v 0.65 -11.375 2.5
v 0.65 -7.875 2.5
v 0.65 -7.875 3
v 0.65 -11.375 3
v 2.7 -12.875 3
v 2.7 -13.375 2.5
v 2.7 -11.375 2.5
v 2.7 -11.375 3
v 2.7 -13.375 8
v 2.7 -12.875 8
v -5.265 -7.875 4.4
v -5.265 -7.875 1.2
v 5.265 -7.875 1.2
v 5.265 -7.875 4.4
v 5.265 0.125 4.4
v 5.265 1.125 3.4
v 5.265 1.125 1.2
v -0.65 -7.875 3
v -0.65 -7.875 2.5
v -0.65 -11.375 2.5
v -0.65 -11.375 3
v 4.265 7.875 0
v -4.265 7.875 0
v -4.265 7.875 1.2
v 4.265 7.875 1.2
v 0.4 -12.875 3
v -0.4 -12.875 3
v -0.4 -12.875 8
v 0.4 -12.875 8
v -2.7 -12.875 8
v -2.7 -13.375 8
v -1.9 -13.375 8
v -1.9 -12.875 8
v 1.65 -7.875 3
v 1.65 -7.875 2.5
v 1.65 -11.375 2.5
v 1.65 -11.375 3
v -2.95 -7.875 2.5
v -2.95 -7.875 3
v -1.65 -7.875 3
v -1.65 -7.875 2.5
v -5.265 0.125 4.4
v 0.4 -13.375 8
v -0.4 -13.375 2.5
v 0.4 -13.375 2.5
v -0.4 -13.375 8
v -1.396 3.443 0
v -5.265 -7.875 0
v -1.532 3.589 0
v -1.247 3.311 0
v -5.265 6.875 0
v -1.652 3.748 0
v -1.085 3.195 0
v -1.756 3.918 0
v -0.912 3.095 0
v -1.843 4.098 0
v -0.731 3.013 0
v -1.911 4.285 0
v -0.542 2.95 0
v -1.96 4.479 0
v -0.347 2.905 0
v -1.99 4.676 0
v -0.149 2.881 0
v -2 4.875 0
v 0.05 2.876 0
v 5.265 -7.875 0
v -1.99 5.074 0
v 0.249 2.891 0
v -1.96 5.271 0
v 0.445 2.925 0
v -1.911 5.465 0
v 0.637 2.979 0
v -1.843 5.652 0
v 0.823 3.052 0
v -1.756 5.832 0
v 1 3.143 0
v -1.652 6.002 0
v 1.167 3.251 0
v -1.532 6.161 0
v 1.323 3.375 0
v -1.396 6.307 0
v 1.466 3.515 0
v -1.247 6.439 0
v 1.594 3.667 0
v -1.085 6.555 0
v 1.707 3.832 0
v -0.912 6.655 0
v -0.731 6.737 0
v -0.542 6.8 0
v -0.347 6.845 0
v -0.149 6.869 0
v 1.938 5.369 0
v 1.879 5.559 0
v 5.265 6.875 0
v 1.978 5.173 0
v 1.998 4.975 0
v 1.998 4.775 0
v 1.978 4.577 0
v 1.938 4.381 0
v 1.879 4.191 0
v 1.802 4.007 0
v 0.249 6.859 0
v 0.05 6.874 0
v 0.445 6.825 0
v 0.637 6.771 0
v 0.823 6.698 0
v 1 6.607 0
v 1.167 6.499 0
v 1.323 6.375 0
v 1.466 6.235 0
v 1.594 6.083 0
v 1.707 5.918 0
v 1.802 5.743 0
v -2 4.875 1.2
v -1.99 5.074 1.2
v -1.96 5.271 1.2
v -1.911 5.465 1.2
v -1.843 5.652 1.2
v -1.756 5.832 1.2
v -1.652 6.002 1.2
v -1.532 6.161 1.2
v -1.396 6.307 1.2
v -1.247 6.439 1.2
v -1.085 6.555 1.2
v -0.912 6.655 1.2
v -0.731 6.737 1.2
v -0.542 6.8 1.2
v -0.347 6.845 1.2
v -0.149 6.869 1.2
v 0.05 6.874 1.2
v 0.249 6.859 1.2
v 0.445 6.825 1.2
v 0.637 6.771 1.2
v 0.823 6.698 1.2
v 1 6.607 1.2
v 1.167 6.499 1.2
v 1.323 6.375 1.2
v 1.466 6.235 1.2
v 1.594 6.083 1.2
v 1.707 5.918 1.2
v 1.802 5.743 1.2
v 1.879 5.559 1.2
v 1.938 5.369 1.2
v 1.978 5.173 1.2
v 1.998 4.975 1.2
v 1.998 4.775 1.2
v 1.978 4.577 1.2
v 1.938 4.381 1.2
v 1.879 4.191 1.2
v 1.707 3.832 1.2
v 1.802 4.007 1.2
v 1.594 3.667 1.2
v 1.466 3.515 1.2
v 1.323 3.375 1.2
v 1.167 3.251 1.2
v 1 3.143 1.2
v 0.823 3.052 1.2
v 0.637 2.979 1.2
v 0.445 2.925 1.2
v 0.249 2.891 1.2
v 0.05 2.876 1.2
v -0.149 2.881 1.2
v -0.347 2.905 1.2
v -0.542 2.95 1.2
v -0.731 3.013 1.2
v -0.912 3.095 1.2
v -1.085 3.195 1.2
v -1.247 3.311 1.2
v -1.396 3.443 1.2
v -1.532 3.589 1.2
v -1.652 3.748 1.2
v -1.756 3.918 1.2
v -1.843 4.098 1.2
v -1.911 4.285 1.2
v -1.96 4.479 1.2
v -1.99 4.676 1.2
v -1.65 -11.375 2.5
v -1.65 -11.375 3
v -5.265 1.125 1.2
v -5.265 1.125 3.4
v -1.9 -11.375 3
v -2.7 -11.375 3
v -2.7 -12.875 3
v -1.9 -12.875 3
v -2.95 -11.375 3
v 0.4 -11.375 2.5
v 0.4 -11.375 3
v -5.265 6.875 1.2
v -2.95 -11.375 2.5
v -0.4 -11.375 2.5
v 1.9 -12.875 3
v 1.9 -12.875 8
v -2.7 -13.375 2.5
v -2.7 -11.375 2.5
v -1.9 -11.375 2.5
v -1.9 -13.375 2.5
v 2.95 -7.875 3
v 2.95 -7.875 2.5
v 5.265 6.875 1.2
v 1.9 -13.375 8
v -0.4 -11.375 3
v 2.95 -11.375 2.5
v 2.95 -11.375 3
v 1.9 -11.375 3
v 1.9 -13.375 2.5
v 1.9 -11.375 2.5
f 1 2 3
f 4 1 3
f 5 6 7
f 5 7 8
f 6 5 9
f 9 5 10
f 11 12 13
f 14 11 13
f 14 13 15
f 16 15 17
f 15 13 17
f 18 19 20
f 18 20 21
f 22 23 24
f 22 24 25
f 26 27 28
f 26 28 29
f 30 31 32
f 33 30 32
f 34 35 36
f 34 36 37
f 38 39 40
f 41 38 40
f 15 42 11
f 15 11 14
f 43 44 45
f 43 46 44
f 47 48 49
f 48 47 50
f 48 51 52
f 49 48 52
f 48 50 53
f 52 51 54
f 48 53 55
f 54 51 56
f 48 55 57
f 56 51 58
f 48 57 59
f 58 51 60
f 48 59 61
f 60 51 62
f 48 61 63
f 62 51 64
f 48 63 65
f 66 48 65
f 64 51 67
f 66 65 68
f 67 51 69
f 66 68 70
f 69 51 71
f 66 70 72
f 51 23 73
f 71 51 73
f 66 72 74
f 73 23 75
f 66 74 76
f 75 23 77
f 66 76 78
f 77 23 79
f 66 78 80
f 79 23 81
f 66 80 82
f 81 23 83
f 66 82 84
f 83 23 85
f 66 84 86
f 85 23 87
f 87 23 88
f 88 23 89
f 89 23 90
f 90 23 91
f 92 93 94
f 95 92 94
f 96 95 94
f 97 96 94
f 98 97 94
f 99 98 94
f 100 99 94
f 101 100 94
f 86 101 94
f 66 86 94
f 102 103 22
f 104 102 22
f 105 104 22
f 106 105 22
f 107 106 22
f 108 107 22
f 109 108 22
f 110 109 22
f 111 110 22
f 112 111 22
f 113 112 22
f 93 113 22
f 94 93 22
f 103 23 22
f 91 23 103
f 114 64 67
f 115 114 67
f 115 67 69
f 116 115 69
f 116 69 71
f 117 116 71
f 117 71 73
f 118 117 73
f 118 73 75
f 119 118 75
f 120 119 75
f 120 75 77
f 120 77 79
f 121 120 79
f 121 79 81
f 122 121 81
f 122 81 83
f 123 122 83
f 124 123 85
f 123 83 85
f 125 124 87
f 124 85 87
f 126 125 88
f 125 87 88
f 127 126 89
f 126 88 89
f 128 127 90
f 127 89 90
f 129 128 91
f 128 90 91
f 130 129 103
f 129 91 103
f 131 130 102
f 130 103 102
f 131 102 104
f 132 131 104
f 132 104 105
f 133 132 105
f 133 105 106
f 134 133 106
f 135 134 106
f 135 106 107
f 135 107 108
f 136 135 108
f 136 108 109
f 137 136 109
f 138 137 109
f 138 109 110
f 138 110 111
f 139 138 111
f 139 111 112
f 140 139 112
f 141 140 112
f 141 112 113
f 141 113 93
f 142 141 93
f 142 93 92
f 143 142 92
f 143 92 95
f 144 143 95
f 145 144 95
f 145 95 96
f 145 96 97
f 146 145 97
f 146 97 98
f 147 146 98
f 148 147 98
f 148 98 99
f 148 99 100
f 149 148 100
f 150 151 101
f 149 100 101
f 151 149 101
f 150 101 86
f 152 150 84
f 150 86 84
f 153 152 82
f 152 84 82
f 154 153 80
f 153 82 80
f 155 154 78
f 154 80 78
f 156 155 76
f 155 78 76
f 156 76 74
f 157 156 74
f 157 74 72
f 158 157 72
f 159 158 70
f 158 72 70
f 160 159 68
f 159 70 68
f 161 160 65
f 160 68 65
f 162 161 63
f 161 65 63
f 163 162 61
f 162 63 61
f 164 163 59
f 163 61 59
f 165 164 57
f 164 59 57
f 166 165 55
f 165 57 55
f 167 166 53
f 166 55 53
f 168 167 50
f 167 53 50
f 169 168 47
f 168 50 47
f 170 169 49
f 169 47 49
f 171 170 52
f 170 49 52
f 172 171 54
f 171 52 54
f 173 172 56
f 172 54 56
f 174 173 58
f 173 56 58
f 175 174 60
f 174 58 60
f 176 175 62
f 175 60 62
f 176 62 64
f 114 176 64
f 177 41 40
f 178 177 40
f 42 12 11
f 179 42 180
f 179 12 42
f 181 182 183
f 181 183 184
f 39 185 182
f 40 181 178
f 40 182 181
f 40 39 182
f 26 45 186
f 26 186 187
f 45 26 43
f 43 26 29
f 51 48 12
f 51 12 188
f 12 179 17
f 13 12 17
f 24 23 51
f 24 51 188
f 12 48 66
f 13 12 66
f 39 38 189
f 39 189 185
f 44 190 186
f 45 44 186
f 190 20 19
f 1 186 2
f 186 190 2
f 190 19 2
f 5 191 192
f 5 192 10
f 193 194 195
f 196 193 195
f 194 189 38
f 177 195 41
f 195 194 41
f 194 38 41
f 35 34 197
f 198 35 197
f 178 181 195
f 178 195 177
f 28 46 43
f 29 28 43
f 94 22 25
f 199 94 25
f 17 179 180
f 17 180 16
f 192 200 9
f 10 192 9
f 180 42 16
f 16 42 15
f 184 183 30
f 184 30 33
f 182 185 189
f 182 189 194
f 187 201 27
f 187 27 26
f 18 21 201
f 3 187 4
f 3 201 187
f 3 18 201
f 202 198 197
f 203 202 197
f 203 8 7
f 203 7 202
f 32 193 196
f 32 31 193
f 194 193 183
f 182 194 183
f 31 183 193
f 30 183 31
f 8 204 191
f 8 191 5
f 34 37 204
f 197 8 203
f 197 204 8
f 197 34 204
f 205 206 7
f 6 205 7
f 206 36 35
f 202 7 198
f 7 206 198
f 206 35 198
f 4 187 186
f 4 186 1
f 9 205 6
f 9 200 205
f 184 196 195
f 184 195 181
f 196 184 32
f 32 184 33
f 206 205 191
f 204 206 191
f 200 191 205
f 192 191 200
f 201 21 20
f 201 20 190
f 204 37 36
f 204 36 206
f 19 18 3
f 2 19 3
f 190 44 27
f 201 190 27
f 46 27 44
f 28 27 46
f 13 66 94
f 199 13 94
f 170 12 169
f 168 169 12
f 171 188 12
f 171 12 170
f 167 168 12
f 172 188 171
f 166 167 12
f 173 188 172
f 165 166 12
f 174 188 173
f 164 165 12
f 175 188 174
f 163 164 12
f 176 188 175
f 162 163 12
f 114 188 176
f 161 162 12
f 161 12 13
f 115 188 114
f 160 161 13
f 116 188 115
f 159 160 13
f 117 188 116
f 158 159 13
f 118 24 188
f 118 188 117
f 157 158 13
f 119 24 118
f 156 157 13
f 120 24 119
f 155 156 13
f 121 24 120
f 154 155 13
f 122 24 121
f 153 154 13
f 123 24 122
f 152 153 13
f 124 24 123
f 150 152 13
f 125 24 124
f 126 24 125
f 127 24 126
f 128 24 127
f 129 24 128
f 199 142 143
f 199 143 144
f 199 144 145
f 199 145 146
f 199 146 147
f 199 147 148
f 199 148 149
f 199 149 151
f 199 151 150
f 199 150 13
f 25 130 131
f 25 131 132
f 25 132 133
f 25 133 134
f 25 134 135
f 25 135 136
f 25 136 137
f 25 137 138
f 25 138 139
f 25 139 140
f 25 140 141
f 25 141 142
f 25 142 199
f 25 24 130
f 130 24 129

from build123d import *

# Parameters (mm, degrees)
F0_W      = 10.53
F0_H      = 15.75
F1_DEPTH  = 1.2
F2_W      = 10.53
F2_H      = 9
F3_DEPTH  = 3.2
F4_SIZE   = 1
F4_2_SIZE = 1
F5_W      = 1.3
F5_H      = 0.5
F6_DEPTH  = 3.5
F7_W      = 0.8
F7_H      = 0.5
F8_DEPTH  = 2
F9_W      = 0.8
F9_H      = 0.5
F10_DEPTH = 5.5
F12_D     = 4


with BuildPart() as f1:
    # F0 (on Top) → F1 (new body)
    with BuildSketch(Plane.XY):
        Rectangle(F0_W, F0_H)
    extrude(amount=F1_DEPTH)

    # F4#2
    f4_2_edges = [f1.edges().sort_by_distance(p)[0] for p in [
        (5.265, 7.875, 0.6),
        (-5.265, 7.875, 0.6),
    ]]
    chamfer(f4_2_edges, length=F4_2_SIZE)

    # F12 (through all)
    with Locations(Plane.XY.offset(1.2)):
        with Locations((0, 4.875)):
            Hole(F12_D / 2)


with BuildPart() as f3:
    # F2 (on face) → F3 (new body)
    with BuildSketch(Plane.XY.offset(1.2)):
        with Locations((0, -3.375)):
            Rectangle(F2_W, F2_H)
    extrude(amount=F3_DEPTH)

    # F4
    f4_edges = [f3.edges().sort_by_distance(p)[0] for p in [
        (0, 1.125, 4.4),
    ]]
    chamfer(f4_edges, length=F4_SIZE)


with BuildPart() as f6:
    # F5 (on face) → F6 (new body)
    with BuildSketch(Plane.XZ.offset(7.875)):
        with Locations((-2.3, 2.75)):
            Rectangle(F5_W, F5_H)
        with Locations((0, 2.75)):
            Rectangle(F5_W, F5_H)
        with Locations((2.3, 2.75)):
            Rectangle(F5_W, F5_H)
    extrude(amount=F6_DEPTH)

    # F7 (on face) → F8 (join)
    with BuildSketch(Plane.XZ.offset(11.375)):
        with Locations((-2.3, 2.75)):
            Rectangle(F7_W, F7_H)
        with Locations((0, 2.75)):
            Rectangle(F7_W, F7_H)
        with Locations((2.3, 2.75)):
            Rectangle(F7_W, F7_H)
    extrude(amount=F8_DEPTH)

    # F9 (on face) → F10 (join)
    with BuildSketch(Plane(origin=(0, 0, 2.5), x_dir=(1, 0, 0), z_dir=(0, 0, -1))):
        with Locations((-2.3, 13.125)):
            Rectangle(F9_W, F9_H)
        with Locations((0, 13.125)):
            Rectangle(F9_W, F9_H)
        with Locations((2.3, 13.125)):
            Rectangle(F9_W, F9_H)
    extrude(amount=-F10_DEPTH)


solid = Compound([f1.part, f3.part, f6.part])
